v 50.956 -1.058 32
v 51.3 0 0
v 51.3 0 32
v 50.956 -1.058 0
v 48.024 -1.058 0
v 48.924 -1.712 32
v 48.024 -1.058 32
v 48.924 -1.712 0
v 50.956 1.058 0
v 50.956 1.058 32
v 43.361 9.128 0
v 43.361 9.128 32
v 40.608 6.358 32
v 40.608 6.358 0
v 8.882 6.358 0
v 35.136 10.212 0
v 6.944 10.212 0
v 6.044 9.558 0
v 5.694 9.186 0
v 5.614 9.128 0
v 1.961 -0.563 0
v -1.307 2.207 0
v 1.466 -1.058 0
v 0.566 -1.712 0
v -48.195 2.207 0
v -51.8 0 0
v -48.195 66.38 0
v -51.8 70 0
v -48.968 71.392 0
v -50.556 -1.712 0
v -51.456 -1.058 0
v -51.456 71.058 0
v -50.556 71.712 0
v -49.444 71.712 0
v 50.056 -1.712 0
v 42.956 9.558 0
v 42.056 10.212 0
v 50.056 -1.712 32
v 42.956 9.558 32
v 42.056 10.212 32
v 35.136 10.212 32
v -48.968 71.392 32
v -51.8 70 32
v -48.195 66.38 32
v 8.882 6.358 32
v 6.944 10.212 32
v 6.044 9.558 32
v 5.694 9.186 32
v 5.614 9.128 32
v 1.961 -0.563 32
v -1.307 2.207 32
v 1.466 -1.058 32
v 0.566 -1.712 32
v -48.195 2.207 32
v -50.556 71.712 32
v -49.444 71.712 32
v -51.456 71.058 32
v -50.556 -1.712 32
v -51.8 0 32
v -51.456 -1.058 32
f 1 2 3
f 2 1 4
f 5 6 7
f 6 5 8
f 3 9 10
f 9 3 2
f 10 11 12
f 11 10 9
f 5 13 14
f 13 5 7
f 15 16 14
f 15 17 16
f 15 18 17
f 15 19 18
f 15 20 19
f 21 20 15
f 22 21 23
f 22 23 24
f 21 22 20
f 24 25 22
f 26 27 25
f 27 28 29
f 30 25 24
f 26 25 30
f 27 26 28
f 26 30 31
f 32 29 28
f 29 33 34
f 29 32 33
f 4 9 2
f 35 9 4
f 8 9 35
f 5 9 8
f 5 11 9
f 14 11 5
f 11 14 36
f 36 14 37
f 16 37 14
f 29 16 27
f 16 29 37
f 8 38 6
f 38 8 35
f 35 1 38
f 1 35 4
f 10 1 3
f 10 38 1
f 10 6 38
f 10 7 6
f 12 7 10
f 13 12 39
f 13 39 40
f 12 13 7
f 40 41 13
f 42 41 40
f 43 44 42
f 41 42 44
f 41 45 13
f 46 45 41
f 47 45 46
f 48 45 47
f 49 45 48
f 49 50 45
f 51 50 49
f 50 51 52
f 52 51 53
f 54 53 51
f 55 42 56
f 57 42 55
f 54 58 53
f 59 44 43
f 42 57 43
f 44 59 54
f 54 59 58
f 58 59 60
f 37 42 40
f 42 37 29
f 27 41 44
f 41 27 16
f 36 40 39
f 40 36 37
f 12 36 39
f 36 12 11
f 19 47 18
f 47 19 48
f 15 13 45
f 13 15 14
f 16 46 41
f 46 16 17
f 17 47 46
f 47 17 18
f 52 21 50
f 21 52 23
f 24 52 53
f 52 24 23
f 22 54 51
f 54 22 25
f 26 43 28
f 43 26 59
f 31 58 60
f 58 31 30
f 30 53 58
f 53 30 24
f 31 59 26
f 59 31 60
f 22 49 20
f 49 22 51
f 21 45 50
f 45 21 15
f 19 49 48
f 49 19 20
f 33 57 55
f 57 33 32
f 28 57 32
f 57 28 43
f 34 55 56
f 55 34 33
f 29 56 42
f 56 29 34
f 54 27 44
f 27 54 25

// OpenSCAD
$fn=10;

module hook(off,d,w=30+3,h=5+3)
{
    linear_extrude(d) {
    polygon(
            points=[
                [-off   ,          0],
                [-off   +h,        h+off],
                [+off   +h+w,      h+off],
                [+off   +h*2+w,    0],
            ]
           );
        }
}

// off2 from hook
module mount(off,off2, d,w=30+3,h=5+3)
{
    linear_extrude(d) {
    polygon(
            points=[
            [-off2,             off],
            [-off-off2 +h,      h+off2-off],
            [-off+off2+h+w,     h+off2-off],
            // this isnt 100% proper but it works
            [+off-50,           -2*off+70],
            [+off-50,           +off]
            ]
           );
    }
}

// for speedup in dev you can: 1) set $fn to 10, 2) disable minkowki and set off=2*minkowski val
minkowski() {
    cylinder(r=1.8,h=16);
color("blue")
union() {
    difference() {
        hook(0.5,16);
        translate([0,-0.01,-0.01])
            scale(1.01)
            hook(0);
    }
difference() {
mount(0,0.5,16);
        translate([0,-0.01,-0.01])
            scale(1.01)
mount(0.5,0.5,16);
}
}
}
